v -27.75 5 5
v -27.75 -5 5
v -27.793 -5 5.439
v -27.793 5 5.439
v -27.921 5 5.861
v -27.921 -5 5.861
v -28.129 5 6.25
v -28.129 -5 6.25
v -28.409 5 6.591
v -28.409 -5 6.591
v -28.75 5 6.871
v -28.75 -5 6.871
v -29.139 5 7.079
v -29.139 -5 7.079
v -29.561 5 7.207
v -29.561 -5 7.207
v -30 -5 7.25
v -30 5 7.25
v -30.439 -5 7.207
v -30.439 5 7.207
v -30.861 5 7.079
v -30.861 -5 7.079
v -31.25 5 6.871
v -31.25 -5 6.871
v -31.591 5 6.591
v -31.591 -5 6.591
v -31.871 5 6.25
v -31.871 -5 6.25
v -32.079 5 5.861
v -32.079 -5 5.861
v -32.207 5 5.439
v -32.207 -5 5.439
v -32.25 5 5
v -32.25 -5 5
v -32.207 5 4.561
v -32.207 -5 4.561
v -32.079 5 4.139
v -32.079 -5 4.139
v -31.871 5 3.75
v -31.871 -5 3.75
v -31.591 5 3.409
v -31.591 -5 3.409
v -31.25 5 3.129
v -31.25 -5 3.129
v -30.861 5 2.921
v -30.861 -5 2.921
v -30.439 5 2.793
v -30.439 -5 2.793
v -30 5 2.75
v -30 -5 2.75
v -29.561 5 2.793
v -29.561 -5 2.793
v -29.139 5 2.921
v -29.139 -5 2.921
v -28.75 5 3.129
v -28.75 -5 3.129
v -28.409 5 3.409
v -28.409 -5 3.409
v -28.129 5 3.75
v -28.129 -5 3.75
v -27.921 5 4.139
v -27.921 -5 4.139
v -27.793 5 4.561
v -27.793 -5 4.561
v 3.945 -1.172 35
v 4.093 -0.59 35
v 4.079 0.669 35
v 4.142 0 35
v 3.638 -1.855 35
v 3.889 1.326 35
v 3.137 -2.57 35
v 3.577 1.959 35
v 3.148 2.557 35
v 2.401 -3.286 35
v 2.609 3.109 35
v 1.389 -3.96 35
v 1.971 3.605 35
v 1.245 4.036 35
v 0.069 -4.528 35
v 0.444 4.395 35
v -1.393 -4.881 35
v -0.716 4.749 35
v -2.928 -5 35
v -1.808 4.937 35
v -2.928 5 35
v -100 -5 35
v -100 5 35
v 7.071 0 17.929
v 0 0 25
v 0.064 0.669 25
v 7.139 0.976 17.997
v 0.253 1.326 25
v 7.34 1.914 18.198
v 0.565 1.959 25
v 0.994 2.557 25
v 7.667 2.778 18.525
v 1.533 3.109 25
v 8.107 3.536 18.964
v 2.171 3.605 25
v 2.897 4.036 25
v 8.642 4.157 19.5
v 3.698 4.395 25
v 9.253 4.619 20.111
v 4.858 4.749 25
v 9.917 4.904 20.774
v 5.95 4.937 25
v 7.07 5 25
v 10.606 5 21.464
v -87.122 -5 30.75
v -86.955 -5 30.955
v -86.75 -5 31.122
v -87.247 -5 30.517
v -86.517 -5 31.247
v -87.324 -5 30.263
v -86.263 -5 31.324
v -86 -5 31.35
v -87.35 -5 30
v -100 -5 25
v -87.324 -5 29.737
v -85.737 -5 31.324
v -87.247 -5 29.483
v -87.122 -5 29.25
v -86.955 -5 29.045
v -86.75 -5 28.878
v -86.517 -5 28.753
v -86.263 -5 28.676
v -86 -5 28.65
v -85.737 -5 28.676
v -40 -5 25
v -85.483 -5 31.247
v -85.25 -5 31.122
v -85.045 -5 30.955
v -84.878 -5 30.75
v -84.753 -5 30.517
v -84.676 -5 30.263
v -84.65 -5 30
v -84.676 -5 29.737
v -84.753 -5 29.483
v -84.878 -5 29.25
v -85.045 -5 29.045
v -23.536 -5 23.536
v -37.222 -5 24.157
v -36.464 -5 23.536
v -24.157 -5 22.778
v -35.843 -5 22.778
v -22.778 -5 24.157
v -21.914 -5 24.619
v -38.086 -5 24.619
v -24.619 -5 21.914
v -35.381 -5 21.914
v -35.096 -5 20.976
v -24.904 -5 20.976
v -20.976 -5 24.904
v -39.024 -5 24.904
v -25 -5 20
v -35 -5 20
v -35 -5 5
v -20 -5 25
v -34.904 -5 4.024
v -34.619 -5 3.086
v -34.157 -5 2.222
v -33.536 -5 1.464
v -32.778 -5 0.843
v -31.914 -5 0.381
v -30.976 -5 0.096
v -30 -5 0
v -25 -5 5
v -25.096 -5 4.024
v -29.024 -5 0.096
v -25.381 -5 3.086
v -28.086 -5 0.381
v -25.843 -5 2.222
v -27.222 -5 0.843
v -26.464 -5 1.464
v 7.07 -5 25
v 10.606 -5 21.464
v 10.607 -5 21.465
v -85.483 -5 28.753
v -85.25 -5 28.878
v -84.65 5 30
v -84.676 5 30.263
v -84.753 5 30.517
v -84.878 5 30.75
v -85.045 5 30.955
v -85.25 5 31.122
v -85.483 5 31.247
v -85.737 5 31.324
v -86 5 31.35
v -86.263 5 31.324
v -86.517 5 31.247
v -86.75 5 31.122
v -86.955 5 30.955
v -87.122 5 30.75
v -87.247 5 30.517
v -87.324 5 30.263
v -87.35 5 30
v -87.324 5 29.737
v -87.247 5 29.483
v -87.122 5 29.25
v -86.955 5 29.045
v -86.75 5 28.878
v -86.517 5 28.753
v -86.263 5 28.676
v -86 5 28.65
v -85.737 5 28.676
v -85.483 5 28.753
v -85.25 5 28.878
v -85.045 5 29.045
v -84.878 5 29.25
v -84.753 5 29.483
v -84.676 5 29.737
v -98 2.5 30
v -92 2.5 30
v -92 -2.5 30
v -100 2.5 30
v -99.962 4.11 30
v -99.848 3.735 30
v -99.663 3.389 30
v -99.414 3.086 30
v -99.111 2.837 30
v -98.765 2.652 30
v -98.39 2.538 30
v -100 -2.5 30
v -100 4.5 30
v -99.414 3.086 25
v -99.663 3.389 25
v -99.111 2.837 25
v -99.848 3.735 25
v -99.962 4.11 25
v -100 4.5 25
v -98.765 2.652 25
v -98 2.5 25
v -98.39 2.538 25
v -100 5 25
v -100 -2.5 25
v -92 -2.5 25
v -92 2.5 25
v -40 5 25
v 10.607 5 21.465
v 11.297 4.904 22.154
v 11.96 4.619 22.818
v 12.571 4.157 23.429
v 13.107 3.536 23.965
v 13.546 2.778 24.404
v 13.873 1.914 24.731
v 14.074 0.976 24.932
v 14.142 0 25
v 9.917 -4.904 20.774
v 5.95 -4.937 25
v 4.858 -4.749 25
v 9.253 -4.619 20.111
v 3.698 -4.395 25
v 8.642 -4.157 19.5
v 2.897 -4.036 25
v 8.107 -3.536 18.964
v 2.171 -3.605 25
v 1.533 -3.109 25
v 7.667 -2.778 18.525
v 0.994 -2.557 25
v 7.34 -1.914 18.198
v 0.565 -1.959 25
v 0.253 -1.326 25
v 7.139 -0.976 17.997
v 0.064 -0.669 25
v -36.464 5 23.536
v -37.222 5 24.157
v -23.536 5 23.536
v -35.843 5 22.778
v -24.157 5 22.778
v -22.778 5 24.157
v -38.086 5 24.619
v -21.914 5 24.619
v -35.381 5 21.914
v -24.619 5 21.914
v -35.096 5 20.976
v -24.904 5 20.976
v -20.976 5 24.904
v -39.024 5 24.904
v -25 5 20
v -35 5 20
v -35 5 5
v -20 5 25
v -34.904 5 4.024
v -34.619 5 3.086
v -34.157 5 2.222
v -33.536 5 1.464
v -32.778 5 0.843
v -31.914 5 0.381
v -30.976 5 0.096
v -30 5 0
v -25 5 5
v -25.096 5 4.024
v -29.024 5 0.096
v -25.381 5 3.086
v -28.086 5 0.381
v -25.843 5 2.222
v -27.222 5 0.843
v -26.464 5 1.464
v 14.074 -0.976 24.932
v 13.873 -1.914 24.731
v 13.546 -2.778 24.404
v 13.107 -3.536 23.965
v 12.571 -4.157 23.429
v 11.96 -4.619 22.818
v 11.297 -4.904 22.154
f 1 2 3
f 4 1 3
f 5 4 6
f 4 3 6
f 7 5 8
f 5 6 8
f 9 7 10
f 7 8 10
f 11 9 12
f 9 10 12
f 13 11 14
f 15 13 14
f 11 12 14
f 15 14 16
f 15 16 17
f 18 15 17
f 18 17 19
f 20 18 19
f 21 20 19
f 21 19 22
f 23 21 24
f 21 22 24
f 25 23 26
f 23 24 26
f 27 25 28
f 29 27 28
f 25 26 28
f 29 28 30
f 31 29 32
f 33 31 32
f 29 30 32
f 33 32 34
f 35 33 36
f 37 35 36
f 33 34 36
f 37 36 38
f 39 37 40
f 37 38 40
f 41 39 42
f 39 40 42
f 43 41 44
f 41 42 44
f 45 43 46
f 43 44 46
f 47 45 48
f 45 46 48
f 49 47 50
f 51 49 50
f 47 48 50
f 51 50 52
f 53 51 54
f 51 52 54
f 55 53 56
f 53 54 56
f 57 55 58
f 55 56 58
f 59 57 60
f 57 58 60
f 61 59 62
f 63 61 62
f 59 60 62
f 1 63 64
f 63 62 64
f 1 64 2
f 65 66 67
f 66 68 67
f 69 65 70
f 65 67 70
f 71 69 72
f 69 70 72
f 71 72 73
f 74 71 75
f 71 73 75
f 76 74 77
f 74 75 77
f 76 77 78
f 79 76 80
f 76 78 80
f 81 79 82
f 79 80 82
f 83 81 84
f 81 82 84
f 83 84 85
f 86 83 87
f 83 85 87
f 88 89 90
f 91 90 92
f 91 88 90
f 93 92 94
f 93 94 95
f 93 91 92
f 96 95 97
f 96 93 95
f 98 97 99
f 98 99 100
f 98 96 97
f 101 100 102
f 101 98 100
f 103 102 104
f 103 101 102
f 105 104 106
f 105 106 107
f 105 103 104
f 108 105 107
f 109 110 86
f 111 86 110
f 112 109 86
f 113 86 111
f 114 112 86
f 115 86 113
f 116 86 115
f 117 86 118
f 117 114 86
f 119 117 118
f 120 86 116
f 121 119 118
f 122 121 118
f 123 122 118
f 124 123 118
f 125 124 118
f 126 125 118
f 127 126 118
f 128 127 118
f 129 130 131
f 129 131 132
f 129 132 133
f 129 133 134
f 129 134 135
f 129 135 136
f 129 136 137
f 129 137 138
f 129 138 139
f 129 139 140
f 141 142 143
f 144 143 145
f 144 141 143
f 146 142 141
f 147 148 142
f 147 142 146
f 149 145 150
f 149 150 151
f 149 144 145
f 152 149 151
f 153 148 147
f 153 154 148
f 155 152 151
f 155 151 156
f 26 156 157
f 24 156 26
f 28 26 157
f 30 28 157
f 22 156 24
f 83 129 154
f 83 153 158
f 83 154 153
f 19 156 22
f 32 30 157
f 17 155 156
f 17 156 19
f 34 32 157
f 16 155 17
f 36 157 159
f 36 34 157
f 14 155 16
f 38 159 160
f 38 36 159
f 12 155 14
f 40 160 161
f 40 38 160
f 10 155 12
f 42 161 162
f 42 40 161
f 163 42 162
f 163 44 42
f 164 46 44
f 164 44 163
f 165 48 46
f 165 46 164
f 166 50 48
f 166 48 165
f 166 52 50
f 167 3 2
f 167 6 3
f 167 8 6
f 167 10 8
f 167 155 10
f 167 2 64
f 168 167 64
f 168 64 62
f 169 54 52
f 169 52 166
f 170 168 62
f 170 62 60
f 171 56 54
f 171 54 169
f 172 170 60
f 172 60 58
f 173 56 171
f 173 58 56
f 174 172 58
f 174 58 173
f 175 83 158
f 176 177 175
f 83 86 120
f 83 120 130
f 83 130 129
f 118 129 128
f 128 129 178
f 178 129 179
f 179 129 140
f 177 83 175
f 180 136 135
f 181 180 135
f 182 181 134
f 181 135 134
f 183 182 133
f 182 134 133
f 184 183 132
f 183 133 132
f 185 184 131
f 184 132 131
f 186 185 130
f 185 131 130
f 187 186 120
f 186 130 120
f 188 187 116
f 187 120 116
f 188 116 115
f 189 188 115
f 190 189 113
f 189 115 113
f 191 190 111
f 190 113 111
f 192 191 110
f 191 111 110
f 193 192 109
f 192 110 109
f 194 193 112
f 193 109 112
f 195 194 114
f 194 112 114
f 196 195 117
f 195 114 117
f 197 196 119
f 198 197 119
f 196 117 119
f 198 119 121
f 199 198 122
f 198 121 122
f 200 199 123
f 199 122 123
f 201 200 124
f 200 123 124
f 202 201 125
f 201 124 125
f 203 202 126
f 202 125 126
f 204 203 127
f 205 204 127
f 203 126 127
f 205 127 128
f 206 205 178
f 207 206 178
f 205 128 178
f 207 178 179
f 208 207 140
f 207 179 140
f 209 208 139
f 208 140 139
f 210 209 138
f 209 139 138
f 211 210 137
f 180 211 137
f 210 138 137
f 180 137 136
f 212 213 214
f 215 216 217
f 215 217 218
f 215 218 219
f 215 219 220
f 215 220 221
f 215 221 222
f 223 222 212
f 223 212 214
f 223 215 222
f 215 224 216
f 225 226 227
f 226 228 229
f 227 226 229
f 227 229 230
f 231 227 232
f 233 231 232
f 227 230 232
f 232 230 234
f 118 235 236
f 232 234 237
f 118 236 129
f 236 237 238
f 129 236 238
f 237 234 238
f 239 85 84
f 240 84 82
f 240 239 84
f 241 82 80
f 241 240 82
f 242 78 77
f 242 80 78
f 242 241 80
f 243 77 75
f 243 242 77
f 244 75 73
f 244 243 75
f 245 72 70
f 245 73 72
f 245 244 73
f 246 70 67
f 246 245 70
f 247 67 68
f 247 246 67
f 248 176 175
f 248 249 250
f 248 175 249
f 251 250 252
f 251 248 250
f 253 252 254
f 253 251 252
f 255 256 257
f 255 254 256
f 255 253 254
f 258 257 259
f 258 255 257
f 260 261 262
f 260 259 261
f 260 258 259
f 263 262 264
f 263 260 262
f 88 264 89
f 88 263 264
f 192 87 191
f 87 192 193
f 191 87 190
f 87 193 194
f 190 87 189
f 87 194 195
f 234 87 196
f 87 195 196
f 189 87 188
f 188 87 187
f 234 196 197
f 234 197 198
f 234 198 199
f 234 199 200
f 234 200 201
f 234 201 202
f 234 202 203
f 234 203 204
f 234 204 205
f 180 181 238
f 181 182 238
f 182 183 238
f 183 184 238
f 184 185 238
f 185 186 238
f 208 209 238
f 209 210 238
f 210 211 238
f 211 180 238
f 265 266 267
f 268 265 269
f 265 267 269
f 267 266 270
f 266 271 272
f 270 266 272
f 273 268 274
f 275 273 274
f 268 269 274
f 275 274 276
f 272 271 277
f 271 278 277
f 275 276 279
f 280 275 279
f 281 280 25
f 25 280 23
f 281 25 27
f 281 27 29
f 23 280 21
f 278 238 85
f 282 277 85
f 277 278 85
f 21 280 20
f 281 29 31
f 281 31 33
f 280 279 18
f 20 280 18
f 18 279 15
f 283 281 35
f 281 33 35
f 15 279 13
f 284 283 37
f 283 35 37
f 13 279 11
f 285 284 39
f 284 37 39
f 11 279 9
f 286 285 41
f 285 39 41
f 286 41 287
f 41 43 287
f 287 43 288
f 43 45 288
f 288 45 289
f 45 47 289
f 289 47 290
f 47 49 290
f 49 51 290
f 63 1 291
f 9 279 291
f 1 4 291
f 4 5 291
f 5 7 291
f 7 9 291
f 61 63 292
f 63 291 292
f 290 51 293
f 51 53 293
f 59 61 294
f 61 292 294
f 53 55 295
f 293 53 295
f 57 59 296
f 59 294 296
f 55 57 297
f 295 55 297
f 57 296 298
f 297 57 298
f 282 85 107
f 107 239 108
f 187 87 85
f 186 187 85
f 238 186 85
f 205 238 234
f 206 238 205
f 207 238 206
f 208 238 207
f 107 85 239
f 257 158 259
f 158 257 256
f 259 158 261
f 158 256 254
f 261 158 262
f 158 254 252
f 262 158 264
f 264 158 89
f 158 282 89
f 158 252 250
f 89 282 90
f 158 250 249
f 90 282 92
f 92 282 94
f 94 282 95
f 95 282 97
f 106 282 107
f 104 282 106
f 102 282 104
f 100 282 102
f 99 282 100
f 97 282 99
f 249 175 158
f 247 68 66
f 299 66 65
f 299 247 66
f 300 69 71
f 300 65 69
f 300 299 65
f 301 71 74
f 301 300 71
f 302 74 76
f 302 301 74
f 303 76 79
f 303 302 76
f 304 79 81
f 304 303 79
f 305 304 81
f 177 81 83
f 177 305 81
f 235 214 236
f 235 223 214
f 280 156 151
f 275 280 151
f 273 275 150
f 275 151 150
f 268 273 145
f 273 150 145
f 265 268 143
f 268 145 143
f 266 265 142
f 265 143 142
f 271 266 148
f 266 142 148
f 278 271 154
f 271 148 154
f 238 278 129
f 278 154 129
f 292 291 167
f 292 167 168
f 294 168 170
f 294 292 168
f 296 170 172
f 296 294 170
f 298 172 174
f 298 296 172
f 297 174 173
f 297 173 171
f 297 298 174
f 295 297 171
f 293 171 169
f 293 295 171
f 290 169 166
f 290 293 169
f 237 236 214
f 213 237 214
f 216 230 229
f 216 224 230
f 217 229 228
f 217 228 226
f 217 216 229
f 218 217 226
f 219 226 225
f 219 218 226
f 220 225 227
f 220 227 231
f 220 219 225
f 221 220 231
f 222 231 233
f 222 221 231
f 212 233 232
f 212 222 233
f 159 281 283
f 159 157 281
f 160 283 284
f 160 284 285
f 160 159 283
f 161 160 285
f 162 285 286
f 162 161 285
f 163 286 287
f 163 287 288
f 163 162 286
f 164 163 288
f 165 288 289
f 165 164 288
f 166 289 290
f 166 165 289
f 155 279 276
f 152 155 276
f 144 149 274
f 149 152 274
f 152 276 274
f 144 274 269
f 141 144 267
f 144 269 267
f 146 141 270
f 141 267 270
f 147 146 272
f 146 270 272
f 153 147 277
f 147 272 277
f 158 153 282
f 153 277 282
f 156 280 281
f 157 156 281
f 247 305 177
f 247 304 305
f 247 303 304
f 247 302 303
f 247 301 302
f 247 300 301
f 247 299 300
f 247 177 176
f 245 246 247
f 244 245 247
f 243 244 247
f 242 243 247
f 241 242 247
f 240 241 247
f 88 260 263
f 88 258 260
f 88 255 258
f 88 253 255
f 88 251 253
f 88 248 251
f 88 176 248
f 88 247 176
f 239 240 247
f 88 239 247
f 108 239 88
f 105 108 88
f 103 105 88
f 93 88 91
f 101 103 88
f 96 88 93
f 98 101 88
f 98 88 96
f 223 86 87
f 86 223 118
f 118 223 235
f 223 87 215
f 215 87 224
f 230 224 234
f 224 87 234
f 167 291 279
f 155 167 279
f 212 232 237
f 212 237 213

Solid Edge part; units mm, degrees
sketch "Sketch1" plane through (0, 0, 0) normal (0, -1, 0) x (1, 0, 0)
  line L0 (0, 25) -> (7.0711, 17.9289)
  line L1 (14.1421, 25) -> (7.0711, 17.9289)
  line L2 (4.1421, 35) -> (14.1421, 25)
  line L3 (4.1421, 35) -> (-100, 35)
  line L4 (-100, 35) -> (-100, 25)
  line L5 (-100, 25) -> (-35, 25)
  line L6 (-35, 25) -> (-35, 0)
  line L7 (-35, 0) -> (-25, 0)
  line L8 (-25, 0) -> (-25, 25)
  line L9 (-25, 25) -> (0, 25)
extrude "Protrusion1" add sketch "Sketch1" along normal mid plane 10
fillet "Round_1" radius 5 4 edges at (3.5355, -5, 21.4645) (3.5355, 5, 21.4645) (9.1421, 5, 30) (9.1421, -5, 30)
sketch "Sketch2" plane through (-61.4645, -5, 24) normal (0, -1, 0) x (1, 0, 0)
  circle A0 centre (31.4645, -19) radius 2.25
extrude "ExtrudedCutout_1" cut sketch "Sketch2" along normal mid plane 69.4908
fillet "Round_2" radius 5 4 edges at (-25, 0, 0) (-35, 0, 0) (-25, 0, 25) (-35, 0, 25)
sketch "Sketch3" plane through (-100, 0, 43) normal (-1, 0, 0) x (0, 0, -1)
  line L0 (18, -2.5) -> (13, -2.5)
  line L1 (13, -2.5) -> (13, 2.5)
  line L2 (13, 2.5) -> (18, 2.5)
  line L3 (18, 2.5) -> (18, -2.5)
extrude "ExtrudedCutout_2" cut sketch "Sketch3" against normal blind 8
sketch "Sketch4" plane through (0, 0, 0) normal (0, -1, 0) x (1, 0, 0)
  circle A0 centre (-86, 30) radius 1.35
extrude "ExtrudedCutout_3" cut sketch "Sketch4" along normal mid plane 29.2691
fillet "Round_3" radius 2 1 edges at (-100, 2.5, 27.5)
properties material "PVC"
